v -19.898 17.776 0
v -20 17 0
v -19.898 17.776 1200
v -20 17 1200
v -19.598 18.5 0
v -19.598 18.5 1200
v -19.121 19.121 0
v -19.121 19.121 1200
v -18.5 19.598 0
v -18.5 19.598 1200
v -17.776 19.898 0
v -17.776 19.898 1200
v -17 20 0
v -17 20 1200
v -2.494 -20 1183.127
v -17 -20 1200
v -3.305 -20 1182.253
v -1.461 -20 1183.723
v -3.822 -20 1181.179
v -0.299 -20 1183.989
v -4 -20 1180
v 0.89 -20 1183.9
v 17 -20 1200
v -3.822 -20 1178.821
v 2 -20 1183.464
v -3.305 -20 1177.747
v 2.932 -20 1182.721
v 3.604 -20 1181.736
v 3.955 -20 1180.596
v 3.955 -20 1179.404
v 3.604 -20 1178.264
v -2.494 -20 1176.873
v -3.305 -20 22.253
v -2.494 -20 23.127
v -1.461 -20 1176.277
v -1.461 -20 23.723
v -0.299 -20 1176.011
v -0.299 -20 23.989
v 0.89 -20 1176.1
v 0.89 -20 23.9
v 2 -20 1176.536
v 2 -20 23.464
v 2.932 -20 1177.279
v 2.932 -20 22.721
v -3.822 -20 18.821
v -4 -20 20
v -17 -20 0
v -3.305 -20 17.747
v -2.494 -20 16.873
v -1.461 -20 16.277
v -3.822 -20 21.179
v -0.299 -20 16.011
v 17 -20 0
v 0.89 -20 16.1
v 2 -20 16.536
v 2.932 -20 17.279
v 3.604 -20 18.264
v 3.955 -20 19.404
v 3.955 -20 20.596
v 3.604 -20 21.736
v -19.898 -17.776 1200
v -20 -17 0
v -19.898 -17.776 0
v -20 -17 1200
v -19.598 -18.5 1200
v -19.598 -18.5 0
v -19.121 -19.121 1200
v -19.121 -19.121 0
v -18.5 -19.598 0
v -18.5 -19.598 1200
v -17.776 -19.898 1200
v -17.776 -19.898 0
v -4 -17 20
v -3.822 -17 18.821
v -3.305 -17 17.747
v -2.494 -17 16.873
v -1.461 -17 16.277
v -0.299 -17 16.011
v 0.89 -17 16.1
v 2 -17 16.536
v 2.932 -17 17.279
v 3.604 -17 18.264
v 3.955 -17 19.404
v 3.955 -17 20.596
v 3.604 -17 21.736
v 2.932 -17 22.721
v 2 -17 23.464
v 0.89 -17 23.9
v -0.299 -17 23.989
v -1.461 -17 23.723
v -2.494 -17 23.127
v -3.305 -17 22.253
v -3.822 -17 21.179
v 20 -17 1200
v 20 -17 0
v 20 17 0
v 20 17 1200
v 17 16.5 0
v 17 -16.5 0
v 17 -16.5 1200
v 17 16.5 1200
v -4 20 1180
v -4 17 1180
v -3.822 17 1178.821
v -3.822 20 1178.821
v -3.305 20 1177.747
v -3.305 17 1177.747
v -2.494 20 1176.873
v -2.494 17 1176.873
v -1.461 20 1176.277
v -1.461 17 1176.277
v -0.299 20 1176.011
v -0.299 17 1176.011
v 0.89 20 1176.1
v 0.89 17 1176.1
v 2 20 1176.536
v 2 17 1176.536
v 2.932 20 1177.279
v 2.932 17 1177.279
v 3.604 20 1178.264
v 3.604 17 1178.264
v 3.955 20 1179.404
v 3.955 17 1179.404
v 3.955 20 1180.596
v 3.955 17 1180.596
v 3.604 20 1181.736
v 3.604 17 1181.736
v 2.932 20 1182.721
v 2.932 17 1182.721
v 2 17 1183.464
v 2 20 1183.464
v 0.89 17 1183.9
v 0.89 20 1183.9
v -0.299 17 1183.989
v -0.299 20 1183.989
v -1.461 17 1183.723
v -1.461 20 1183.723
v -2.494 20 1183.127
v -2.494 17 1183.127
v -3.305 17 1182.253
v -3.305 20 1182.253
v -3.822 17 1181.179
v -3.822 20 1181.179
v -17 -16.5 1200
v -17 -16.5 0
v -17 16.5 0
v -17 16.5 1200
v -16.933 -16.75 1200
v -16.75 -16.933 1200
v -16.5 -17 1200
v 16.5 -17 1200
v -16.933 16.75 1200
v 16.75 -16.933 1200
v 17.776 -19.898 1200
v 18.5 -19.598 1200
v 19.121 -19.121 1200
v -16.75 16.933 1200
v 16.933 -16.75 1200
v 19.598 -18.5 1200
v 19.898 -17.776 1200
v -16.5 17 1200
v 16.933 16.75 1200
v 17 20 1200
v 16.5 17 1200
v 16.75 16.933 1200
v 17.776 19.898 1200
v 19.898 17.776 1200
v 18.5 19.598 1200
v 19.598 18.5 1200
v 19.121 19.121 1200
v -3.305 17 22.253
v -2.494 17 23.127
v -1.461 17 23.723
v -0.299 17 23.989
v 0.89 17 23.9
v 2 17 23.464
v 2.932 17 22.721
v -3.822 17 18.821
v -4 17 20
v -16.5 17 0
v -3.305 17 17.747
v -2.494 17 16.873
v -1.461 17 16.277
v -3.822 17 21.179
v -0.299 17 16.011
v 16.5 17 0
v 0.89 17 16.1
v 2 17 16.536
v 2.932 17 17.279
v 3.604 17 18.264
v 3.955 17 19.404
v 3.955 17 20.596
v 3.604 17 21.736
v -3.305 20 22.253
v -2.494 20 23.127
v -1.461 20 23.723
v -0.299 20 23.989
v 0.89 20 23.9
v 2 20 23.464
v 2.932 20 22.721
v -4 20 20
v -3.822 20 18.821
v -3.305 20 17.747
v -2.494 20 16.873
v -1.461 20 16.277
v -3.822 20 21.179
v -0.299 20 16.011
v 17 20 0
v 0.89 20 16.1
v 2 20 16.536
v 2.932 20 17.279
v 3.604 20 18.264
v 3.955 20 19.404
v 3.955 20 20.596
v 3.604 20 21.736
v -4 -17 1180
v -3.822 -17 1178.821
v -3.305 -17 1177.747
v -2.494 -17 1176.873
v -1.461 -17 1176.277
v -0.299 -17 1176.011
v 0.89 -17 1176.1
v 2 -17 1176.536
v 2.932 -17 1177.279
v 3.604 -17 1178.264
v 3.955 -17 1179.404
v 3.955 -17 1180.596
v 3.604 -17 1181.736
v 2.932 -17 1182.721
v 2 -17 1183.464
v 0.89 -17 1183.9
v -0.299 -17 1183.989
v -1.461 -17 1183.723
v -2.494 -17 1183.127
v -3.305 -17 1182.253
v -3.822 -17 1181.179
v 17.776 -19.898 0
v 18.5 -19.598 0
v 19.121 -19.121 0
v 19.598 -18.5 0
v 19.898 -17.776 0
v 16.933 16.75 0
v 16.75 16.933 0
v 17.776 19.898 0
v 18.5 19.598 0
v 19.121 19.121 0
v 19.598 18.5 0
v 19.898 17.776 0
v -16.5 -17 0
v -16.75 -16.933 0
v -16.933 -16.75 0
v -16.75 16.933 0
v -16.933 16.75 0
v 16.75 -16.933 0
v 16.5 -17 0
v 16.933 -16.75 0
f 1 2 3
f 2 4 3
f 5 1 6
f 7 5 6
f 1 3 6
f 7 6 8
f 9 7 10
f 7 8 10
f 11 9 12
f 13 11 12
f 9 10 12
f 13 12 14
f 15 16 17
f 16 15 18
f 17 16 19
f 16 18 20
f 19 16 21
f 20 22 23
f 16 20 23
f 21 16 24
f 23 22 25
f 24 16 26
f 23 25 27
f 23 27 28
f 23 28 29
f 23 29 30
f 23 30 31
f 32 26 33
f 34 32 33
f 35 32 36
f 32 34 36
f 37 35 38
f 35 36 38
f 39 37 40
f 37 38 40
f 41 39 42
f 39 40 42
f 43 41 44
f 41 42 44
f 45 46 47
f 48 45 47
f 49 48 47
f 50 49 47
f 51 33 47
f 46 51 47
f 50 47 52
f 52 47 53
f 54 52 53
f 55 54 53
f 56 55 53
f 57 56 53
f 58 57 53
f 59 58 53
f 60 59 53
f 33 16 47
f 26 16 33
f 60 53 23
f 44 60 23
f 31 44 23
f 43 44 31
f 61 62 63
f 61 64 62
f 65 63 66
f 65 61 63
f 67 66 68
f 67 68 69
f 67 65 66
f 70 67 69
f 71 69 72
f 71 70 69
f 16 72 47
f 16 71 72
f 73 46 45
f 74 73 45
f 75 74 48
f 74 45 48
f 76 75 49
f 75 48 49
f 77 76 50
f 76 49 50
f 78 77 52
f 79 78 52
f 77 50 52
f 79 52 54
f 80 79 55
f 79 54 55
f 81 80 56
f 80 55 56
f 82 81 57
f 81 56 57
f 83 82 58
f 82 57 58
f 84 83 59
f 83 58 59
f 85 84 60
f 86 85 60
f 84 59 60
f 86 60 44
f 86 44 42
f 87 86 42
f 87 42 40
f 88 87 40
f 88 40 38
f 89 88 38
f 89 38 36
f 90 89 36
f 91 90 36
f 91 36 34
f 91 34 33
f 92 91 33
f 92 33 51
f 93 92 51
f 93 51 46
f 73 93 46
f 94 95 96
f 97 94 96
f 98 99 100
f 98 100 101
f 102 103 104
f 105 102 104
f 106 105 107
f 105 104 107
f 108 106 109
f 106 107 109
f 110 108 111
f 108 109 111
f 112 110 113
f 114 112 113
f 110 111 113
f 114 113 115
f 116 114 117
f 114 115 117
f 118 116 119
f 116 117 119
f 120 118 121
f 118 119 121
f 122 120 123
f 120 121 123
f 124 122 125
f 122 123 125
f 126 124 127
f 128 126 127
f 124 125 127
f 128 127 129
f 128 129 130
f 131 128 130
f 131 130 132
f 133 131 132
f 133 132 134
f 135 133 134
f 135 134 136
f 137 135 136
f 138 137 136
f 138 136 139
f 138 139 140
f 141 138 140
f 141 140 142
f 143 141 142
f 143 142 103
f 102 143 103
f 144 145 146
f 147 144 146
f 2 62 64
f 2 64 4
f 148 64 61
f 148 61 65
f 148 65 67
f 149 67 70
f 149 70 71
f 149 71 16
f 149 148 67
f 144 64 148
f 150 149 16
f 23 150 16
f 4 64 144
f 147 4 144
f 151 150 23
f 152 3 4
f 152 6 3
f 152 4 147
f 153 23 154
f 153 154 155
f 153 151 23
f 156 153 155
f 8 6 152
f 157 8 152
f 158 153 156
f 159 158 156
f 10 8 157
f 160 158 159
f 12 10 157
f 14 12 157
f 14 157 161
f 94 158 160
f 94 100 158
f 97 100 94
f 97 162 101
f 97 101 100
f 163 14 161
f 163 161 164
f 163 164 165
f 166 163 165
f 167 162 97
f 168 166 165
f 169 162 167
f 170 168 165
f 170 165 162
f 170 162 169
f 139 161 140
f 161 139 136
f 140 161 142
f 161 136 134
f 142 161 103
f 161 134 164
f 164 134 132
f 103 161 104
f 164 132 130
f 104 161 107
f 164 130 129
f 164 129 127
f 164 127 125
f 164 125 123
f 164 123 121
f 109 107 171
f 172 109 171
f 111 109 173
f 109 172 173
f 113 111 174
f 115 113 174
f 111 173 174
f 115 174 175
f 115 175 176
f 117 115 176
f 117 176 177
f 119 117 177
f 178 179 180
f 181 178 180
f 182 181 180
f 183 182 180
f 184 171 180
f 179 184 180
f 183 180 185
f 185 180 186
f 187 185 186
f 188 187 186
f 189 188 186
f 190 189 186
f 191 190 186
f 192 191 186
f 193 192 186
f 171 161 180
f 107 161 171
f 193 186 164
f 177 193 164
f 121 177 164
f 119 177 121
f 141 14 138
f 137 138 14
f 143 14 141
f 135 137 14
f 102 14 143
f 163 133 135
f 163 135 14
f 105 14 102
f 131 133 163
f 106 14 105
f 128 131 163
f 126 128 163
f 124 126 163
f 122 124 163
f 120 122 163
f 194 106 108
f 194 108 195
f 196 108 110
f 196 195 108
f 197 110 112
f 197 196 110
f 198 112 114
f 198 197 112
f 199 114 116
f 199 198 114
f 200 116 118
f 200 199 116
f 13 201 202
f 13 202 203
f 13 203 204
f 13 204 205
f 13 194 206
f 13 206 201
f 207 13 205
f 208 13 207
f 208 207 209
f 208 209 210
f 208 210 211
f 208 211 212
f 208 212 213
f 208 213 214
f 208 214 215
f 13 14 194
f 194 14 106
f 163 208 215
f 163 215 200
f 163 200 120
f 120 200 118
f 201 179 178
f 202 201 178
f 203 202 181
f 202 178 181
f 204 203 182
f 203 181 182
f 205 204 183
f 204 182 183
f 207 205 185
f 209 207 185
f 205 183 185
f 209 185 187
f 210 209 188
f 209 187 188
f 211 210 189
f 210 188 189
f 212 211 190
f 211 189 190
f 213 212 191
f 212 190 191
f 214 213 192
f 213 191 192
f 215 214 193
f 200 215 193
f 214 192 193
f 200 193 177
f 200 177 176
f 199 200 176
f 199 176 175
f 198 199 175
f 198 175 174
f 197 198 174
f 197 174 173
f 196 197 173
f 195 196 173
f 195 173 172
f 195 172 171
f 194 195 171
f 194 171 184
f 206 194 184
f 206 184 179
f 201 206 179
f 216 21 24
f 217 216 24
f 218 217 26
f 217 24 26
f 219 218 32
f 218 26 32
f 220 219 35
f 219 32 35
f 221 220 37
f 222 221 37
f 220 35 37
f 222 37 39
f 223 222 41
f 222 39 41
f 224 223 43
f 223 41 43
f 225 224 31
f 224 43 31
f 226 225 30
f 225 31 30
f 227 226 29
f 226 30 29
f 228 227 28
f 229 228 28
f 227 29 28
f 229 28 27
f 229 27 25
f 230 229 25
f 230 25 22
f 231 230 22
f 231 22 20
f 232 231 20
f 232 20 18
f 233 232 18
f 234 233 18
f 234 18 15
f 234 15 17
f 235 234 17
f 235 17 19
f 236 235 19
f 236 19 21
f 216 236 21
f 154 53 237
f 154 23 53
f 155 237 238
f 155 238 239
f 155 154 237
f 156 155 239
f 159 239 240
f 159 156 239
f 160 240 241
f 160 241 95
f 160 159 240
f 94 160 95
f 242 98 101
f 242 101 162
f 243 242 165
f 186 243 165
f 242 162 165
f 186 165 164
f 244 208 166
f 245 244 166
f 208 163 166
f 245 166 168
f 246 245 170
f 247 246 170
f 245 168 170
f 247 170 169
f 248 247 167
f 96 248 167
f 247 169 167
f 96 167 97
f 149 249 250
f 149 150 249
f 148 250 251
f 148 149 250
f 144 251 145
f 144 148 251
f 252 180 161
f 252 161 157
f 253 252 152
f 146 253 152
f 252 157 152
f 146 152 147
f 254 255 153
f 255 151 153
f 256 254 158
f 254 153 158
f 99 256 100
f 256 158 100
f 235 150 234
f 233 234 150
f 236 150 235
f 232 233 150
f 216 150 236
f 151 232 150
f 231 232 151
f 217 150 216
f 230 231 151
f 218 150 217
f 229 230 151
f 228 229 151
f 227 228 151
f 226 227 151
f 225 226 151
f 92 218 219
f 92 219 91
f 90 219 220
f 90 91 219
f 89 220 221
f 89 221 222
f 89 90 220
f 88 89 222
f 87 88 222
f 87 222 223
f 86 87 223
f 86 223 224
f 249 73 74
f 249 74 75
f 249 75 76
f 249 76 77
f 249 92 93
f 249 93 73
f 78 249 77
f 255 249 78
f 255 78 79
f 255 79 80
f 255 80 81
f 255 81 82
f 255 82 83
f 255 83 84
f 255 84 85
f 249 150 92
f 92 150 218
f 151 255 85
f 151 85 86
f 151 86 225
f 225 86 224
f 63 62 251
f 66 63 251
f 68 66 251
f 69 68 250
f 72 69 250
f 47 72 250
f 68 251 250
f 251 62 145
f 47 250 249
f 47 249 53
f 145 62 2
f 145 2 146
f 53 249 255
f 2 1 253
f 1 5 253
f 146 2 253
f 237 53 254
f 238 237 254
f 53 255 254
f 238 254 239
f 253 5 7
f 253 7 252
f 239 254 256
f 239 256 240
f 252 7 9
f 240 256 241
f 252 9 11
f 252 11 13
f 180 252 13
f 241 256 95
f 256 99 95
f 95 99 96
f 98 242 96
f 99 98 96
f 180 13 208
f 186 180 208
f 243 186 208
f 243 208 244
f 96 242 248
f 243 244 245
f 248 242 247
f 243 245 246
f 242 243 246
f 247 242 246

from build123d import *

# Parameters (mm, degrees)
SKETCH1_W                = 40
SKETCH1_H                = 40
SKETCH1_W_2              = 34
SKETCH1_H_2              = 34
EXTRUDE_THIN1_DEPTH      = 1200
FILLET1_R                = 0.5
FILLET2_R                = 3
F_8_0_8_DIAMETER_HOLE1_D = 8


with BuildPart() as part:
    # Sketch1 → Extrude-Thin1 (new body)
    with BuildSketch(Plane.XY):
        Rectangle(SKETCH1_W, SKETCH1_H)
        Rectangle(SKETCH1_W_2, SKETCH1_H_2, mode=Mode.SUBTRACT)
    extrude(amount=EXTRUDE_THIN1_DEPTH)

    # Fillet1
    fillet1_edges = [part.edges().sort_by_distance(p)[0] for p in [
        (17, -17, 600),
        (17, 17, 600),
        (-17, 17, 600),
        (-17, -17, 600),
    ]]
    fillet(fillet1_edges, radius=FILLET1_R)

    # Fillet2
    fillet2_edges = [part.edges().sort_by_distance(p)[0] for p in [
        (20, -20, 600),
        (-20, -20, 600),
        (-20, 20, 600),
        (20, 20, 600),
    ]]
    fillet(fillet2_edges, radius=FILLET2_R)

    # Ø8.0 (8) Diameter Hole1 (through all)
    with Locations(Plane(origin=(0, 20, 0), x_dir=(1, 0, 0), z_dir=(0, 1, 0))):
        with Locations((0, -20), (0, -1180)):
            Hole(F_8_0_8_DIAMETER_HOLE1_D / 2)


solid = part.part
